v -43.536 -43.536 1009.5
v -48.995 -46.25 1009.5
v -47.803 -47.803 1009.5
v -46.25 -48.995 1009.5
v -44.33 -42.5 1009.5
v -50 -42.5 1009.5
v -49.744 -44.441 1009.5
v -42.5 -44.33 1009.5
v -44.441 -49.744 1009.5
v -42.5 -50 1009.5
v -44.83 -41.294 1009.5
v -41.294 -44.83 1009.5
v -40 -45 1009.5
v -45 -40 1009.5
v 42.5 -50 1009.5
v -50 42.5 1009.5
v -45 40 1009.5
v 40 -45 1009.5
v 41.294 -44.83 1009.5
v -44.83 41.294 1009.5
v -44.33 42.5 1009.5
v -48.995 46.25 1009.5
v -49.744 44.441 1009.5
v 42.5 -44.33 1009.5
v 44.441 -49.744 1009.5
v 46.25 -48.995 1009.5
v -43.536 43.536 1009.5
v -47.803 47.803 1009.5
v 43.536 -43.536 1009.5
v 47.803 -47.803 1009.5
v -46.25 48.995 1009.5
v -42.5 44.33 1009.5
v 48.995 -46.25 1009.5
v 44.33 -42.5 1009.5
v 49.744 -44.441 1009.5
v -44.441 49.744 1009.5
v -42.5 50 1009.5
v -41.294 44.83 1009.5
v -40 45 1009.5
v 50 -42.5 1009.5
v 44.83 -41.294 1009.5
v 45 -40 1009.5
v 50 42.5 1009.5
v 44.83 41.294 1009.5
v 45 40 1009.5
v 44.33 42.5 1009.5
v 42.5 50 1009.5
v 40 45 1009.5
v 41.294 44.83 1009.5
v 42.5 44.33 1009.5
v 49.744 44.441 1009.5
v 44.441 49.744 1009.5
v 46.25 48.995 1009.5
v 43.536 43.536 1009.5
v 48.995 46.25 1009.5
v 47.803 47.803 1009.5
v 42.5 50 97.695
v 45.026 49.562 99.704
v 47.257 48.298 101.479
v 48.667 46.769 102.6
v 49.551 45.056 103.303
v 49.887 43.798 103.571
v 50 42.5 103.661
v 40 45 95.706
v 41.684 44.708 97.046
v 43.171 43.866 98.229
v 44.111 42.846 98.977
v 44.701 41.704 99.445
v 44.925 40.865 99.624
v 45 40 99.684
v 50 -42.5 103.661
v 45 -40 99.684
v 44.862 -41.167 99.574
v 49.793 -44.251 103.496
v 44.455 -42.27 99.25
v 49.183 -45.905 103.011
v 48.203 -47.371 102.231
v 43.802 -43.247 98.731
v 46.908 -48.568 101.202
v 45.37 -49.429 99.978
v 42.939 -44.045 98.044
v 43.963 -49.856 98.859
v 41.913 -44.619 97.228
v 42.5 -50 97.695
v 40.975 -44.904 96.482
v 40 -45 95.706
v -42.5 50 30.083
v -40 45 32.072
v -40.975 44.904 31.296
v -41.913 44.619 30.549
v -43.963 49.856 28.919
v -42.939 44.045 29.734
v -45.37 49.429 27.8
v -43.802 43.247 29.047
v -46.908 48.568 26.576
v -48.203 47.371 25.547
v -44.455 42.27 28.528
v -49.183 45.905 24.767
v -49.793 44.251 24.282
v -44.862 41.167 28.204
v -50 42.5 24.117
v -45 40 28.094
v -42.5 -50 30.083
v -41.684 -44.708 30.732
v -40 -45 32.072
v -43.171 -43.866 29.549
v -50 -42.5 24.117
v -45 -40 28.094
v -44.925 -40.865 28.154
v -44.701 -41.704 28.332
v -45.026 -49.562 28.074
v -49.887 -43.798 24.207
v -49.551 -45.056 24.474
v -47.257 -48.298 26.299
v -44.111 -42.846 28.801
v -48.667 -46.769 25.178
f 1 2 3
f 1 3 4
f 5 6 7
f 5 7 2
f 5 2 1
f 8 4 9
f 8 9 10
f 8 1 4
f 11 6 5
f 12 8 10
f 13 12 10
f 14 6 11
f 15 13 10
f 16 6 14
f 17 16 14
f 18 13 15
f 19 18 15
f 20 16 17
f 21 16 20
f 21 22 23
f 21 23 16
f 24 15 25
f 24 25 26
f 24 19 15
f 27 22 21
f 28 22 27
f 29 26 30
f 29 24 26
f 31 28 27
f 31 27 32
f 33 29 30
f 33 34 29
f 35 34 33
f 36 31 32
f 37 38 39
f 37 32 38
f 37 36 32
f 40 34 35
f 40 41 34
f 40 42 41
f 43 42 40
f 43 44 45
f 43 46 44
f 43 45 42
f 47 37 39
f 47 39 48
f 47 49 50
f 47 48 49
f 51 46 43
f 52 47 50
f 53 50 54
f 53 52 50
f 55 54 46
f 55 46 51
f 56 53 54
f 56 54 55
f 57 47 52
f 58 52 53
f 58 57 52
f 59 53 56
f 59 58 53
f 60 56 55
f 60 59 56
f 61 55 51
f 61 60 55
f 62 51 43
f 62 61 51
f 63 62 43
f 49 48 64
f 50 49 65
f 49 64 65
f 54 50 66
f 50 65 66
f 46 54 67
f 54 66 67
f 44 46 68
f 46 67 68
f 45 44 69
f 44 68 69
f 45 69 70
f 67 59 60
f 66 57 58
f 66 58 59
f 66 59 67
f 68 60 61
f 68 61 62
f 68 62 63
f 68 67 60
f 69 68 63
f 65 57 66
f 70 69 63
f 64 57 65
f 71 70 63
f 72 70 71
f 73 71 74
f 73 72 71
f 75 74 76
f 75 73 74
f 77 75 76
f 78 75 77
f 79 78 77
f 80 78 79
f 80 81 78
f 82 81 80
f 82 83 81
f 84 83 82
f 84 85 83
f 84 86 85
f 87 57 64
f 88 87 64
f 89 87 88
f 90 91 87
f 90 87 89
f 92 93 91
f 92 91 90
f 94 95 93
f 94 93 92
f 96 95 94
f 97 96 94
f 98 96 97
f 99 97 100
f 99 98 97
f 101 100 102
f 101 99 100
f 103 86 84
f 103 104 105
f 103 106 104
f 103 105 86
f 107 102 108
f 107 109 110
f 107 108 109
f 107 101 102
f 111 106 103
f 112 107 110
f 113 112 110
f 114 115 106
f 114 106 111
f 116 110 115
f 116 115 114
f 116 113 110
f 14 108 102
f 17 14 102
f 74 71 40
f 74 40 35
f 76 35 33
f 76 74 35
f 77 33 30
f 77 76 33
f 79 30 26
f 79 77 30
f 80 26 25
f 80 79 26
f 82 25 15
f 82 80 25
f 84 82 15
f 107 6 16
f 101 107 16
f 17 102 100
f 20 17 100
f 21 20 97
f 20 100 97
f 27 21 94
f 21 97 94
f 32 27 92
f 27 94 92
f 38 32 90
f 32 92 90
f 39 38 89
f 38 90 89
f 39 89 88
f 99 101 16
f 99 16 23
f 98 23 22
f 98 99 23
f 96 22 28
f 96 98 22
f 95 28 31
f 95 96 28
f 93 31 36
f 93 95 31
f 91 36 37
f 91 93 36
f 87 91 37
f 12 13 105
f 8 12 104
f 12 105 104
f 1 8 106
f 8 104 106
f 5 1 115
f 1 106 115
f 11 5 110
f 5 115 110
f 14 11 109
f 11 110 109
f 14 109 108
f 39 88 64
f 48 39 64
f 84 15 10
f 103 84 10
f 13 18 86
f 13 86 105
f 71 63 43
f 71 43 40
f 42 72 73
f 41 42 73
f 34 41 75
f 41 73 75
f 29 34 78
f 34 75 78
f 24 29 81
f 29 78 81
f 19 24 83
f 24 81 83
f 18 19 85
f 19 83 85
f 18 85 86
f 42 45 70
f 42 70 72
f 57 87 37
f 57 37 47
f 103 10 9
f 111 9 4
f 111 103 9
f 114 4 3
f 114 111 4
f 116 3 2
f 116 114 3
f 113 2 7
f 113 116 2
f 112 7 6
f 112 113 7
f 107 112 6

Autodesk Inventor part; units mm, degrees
ref_plane "Start Plane" through (0, 0, 24.1171) normal (0, 0, 1) x (1, 0, 0)
ref_plane "End Plane" through (0, 0, 1009.5) normal (0, 0, 1) x (1, 0, 0)
sketch "Sketch" plane through (0, 0, 0) normal (0, 0, 1) x (1, 0, 0)
  line L0 (-50, -42.5) -> (-50, 42.5)
  line L1 (-42.5, 50) -> (42.5, 50)
  line L2 (50, 42.5) -> (50, -42.5)
  line L3 (42.5, -50) -> (-42.5, -50)
  arc A0 (-50, -42.5) -> (-42.5, -50) centre (-42.5, -42.5) ccw
  arc A1 (-42.5, 50) -> (-50, 42.5) centre (-42.5, 42.5) ccw
  arc A2 (50, 42.5) -> (42.5, 50) centre (42.5, 42.5) ccw
  arc A3 (42.5, -50) -> (50, -42.5) centre (42.5, -42.5) ccw
  line L4 (-40, 45) -> (40, 45)
  line L5 (45, 40) -> (45, -40)
  line L6 (40, -45) -> (-40, -45)
  line L7 (-45, -40) -> (-45, 40)
  line L8 (0, 72.1746) -> (0, -72.1746) construction
  line L9 (-72.1746, 0) -> (72.1746, 0) construction
  arc A4 (-45, -40) -> (-40, -45) centre (-40, -40) ccw
  arc A5 (-40, 45) -> (-45, 40) centre (-40, 40) ccw
  arc A6 (45, 40) -> (40, 45) centre (40, 40) ccw
  arc A7 (40, -45) -> (45, -40) centre (40, -40) ccw
  dimension "d7" = 7.5
  dimension "d10" = 100
  dimension "d11" = 100
  dimension "d12" = 5
  dimension "d15" = 50
  dimension "d16" = 50
  dimension "d19" = 5
  dimension "d20" = 5
extrude "Body" add sketch "Sketch" along normal up to surface (985.3829 mm away) from surface at 24.1171
sketch "Sketch3" plane through (0, 0, 0) normal (0, 0, 1) x (1, 0, 0)
  line L0 (0, 0) -> (10, 0)
ref_plane "Work Plane3" through (0, 0, 0) normal (0, -1, 0) x (1, 0, 0)
ref_plane "Work Plane6" through (460.6876, 42.5, 430.3364) normal (0.6225, 0, -0.7826) x (-0.7826, 0, -0.6225)
split "Split3" plane through (460.6876, 42.5, 430.3364) removes the side toward (0.6225, 0, -0.7826)
sketch "Sketch4" plane through (0, 0, 0) normal (0, -1, 0) x (1, 0, 0)
  line L0 (-2, 24.1171) -> (12, 24.1171) projected
  line L1 (-2, 1009.5) -> (12, 1009.5) projected
  dimension "d18" = 985.3829
equation "\"d7\" = G_IR"
equation "\"d10\" = G_H"
equation "\"d11\" = G_W"
equation "\"d12\" = G_T"
equation "\"d15\" = 0.5 * d10"
equation "\"d16\" = 0.5 * d11"
equation "\"d19\" = G_T"
equation "\"d20\" = G_T"
equation "\"d3\" = G_L"
equation "\"G_W\" = 100"
equation "\"G_H\" = 100"
equation "\"G_T\" = 5"
equation "\"G_IR\" = 7.5"
equation "\"G_L\" = d18"
equation "\"G_OFFSET_START\" = -24.11714"
equation "\"G_OFFSET_END\" = 0"
equation "\"d13\" = -G_OFFSET_START"
equation "\"d14\" = G_OFFSET_END + B_L"
equation "\"B_L\" = 1009.5"
properties part number "DIN EN 10210-2 - 100 x 100 x 5 - 985,38" material "Steel, Mild"
